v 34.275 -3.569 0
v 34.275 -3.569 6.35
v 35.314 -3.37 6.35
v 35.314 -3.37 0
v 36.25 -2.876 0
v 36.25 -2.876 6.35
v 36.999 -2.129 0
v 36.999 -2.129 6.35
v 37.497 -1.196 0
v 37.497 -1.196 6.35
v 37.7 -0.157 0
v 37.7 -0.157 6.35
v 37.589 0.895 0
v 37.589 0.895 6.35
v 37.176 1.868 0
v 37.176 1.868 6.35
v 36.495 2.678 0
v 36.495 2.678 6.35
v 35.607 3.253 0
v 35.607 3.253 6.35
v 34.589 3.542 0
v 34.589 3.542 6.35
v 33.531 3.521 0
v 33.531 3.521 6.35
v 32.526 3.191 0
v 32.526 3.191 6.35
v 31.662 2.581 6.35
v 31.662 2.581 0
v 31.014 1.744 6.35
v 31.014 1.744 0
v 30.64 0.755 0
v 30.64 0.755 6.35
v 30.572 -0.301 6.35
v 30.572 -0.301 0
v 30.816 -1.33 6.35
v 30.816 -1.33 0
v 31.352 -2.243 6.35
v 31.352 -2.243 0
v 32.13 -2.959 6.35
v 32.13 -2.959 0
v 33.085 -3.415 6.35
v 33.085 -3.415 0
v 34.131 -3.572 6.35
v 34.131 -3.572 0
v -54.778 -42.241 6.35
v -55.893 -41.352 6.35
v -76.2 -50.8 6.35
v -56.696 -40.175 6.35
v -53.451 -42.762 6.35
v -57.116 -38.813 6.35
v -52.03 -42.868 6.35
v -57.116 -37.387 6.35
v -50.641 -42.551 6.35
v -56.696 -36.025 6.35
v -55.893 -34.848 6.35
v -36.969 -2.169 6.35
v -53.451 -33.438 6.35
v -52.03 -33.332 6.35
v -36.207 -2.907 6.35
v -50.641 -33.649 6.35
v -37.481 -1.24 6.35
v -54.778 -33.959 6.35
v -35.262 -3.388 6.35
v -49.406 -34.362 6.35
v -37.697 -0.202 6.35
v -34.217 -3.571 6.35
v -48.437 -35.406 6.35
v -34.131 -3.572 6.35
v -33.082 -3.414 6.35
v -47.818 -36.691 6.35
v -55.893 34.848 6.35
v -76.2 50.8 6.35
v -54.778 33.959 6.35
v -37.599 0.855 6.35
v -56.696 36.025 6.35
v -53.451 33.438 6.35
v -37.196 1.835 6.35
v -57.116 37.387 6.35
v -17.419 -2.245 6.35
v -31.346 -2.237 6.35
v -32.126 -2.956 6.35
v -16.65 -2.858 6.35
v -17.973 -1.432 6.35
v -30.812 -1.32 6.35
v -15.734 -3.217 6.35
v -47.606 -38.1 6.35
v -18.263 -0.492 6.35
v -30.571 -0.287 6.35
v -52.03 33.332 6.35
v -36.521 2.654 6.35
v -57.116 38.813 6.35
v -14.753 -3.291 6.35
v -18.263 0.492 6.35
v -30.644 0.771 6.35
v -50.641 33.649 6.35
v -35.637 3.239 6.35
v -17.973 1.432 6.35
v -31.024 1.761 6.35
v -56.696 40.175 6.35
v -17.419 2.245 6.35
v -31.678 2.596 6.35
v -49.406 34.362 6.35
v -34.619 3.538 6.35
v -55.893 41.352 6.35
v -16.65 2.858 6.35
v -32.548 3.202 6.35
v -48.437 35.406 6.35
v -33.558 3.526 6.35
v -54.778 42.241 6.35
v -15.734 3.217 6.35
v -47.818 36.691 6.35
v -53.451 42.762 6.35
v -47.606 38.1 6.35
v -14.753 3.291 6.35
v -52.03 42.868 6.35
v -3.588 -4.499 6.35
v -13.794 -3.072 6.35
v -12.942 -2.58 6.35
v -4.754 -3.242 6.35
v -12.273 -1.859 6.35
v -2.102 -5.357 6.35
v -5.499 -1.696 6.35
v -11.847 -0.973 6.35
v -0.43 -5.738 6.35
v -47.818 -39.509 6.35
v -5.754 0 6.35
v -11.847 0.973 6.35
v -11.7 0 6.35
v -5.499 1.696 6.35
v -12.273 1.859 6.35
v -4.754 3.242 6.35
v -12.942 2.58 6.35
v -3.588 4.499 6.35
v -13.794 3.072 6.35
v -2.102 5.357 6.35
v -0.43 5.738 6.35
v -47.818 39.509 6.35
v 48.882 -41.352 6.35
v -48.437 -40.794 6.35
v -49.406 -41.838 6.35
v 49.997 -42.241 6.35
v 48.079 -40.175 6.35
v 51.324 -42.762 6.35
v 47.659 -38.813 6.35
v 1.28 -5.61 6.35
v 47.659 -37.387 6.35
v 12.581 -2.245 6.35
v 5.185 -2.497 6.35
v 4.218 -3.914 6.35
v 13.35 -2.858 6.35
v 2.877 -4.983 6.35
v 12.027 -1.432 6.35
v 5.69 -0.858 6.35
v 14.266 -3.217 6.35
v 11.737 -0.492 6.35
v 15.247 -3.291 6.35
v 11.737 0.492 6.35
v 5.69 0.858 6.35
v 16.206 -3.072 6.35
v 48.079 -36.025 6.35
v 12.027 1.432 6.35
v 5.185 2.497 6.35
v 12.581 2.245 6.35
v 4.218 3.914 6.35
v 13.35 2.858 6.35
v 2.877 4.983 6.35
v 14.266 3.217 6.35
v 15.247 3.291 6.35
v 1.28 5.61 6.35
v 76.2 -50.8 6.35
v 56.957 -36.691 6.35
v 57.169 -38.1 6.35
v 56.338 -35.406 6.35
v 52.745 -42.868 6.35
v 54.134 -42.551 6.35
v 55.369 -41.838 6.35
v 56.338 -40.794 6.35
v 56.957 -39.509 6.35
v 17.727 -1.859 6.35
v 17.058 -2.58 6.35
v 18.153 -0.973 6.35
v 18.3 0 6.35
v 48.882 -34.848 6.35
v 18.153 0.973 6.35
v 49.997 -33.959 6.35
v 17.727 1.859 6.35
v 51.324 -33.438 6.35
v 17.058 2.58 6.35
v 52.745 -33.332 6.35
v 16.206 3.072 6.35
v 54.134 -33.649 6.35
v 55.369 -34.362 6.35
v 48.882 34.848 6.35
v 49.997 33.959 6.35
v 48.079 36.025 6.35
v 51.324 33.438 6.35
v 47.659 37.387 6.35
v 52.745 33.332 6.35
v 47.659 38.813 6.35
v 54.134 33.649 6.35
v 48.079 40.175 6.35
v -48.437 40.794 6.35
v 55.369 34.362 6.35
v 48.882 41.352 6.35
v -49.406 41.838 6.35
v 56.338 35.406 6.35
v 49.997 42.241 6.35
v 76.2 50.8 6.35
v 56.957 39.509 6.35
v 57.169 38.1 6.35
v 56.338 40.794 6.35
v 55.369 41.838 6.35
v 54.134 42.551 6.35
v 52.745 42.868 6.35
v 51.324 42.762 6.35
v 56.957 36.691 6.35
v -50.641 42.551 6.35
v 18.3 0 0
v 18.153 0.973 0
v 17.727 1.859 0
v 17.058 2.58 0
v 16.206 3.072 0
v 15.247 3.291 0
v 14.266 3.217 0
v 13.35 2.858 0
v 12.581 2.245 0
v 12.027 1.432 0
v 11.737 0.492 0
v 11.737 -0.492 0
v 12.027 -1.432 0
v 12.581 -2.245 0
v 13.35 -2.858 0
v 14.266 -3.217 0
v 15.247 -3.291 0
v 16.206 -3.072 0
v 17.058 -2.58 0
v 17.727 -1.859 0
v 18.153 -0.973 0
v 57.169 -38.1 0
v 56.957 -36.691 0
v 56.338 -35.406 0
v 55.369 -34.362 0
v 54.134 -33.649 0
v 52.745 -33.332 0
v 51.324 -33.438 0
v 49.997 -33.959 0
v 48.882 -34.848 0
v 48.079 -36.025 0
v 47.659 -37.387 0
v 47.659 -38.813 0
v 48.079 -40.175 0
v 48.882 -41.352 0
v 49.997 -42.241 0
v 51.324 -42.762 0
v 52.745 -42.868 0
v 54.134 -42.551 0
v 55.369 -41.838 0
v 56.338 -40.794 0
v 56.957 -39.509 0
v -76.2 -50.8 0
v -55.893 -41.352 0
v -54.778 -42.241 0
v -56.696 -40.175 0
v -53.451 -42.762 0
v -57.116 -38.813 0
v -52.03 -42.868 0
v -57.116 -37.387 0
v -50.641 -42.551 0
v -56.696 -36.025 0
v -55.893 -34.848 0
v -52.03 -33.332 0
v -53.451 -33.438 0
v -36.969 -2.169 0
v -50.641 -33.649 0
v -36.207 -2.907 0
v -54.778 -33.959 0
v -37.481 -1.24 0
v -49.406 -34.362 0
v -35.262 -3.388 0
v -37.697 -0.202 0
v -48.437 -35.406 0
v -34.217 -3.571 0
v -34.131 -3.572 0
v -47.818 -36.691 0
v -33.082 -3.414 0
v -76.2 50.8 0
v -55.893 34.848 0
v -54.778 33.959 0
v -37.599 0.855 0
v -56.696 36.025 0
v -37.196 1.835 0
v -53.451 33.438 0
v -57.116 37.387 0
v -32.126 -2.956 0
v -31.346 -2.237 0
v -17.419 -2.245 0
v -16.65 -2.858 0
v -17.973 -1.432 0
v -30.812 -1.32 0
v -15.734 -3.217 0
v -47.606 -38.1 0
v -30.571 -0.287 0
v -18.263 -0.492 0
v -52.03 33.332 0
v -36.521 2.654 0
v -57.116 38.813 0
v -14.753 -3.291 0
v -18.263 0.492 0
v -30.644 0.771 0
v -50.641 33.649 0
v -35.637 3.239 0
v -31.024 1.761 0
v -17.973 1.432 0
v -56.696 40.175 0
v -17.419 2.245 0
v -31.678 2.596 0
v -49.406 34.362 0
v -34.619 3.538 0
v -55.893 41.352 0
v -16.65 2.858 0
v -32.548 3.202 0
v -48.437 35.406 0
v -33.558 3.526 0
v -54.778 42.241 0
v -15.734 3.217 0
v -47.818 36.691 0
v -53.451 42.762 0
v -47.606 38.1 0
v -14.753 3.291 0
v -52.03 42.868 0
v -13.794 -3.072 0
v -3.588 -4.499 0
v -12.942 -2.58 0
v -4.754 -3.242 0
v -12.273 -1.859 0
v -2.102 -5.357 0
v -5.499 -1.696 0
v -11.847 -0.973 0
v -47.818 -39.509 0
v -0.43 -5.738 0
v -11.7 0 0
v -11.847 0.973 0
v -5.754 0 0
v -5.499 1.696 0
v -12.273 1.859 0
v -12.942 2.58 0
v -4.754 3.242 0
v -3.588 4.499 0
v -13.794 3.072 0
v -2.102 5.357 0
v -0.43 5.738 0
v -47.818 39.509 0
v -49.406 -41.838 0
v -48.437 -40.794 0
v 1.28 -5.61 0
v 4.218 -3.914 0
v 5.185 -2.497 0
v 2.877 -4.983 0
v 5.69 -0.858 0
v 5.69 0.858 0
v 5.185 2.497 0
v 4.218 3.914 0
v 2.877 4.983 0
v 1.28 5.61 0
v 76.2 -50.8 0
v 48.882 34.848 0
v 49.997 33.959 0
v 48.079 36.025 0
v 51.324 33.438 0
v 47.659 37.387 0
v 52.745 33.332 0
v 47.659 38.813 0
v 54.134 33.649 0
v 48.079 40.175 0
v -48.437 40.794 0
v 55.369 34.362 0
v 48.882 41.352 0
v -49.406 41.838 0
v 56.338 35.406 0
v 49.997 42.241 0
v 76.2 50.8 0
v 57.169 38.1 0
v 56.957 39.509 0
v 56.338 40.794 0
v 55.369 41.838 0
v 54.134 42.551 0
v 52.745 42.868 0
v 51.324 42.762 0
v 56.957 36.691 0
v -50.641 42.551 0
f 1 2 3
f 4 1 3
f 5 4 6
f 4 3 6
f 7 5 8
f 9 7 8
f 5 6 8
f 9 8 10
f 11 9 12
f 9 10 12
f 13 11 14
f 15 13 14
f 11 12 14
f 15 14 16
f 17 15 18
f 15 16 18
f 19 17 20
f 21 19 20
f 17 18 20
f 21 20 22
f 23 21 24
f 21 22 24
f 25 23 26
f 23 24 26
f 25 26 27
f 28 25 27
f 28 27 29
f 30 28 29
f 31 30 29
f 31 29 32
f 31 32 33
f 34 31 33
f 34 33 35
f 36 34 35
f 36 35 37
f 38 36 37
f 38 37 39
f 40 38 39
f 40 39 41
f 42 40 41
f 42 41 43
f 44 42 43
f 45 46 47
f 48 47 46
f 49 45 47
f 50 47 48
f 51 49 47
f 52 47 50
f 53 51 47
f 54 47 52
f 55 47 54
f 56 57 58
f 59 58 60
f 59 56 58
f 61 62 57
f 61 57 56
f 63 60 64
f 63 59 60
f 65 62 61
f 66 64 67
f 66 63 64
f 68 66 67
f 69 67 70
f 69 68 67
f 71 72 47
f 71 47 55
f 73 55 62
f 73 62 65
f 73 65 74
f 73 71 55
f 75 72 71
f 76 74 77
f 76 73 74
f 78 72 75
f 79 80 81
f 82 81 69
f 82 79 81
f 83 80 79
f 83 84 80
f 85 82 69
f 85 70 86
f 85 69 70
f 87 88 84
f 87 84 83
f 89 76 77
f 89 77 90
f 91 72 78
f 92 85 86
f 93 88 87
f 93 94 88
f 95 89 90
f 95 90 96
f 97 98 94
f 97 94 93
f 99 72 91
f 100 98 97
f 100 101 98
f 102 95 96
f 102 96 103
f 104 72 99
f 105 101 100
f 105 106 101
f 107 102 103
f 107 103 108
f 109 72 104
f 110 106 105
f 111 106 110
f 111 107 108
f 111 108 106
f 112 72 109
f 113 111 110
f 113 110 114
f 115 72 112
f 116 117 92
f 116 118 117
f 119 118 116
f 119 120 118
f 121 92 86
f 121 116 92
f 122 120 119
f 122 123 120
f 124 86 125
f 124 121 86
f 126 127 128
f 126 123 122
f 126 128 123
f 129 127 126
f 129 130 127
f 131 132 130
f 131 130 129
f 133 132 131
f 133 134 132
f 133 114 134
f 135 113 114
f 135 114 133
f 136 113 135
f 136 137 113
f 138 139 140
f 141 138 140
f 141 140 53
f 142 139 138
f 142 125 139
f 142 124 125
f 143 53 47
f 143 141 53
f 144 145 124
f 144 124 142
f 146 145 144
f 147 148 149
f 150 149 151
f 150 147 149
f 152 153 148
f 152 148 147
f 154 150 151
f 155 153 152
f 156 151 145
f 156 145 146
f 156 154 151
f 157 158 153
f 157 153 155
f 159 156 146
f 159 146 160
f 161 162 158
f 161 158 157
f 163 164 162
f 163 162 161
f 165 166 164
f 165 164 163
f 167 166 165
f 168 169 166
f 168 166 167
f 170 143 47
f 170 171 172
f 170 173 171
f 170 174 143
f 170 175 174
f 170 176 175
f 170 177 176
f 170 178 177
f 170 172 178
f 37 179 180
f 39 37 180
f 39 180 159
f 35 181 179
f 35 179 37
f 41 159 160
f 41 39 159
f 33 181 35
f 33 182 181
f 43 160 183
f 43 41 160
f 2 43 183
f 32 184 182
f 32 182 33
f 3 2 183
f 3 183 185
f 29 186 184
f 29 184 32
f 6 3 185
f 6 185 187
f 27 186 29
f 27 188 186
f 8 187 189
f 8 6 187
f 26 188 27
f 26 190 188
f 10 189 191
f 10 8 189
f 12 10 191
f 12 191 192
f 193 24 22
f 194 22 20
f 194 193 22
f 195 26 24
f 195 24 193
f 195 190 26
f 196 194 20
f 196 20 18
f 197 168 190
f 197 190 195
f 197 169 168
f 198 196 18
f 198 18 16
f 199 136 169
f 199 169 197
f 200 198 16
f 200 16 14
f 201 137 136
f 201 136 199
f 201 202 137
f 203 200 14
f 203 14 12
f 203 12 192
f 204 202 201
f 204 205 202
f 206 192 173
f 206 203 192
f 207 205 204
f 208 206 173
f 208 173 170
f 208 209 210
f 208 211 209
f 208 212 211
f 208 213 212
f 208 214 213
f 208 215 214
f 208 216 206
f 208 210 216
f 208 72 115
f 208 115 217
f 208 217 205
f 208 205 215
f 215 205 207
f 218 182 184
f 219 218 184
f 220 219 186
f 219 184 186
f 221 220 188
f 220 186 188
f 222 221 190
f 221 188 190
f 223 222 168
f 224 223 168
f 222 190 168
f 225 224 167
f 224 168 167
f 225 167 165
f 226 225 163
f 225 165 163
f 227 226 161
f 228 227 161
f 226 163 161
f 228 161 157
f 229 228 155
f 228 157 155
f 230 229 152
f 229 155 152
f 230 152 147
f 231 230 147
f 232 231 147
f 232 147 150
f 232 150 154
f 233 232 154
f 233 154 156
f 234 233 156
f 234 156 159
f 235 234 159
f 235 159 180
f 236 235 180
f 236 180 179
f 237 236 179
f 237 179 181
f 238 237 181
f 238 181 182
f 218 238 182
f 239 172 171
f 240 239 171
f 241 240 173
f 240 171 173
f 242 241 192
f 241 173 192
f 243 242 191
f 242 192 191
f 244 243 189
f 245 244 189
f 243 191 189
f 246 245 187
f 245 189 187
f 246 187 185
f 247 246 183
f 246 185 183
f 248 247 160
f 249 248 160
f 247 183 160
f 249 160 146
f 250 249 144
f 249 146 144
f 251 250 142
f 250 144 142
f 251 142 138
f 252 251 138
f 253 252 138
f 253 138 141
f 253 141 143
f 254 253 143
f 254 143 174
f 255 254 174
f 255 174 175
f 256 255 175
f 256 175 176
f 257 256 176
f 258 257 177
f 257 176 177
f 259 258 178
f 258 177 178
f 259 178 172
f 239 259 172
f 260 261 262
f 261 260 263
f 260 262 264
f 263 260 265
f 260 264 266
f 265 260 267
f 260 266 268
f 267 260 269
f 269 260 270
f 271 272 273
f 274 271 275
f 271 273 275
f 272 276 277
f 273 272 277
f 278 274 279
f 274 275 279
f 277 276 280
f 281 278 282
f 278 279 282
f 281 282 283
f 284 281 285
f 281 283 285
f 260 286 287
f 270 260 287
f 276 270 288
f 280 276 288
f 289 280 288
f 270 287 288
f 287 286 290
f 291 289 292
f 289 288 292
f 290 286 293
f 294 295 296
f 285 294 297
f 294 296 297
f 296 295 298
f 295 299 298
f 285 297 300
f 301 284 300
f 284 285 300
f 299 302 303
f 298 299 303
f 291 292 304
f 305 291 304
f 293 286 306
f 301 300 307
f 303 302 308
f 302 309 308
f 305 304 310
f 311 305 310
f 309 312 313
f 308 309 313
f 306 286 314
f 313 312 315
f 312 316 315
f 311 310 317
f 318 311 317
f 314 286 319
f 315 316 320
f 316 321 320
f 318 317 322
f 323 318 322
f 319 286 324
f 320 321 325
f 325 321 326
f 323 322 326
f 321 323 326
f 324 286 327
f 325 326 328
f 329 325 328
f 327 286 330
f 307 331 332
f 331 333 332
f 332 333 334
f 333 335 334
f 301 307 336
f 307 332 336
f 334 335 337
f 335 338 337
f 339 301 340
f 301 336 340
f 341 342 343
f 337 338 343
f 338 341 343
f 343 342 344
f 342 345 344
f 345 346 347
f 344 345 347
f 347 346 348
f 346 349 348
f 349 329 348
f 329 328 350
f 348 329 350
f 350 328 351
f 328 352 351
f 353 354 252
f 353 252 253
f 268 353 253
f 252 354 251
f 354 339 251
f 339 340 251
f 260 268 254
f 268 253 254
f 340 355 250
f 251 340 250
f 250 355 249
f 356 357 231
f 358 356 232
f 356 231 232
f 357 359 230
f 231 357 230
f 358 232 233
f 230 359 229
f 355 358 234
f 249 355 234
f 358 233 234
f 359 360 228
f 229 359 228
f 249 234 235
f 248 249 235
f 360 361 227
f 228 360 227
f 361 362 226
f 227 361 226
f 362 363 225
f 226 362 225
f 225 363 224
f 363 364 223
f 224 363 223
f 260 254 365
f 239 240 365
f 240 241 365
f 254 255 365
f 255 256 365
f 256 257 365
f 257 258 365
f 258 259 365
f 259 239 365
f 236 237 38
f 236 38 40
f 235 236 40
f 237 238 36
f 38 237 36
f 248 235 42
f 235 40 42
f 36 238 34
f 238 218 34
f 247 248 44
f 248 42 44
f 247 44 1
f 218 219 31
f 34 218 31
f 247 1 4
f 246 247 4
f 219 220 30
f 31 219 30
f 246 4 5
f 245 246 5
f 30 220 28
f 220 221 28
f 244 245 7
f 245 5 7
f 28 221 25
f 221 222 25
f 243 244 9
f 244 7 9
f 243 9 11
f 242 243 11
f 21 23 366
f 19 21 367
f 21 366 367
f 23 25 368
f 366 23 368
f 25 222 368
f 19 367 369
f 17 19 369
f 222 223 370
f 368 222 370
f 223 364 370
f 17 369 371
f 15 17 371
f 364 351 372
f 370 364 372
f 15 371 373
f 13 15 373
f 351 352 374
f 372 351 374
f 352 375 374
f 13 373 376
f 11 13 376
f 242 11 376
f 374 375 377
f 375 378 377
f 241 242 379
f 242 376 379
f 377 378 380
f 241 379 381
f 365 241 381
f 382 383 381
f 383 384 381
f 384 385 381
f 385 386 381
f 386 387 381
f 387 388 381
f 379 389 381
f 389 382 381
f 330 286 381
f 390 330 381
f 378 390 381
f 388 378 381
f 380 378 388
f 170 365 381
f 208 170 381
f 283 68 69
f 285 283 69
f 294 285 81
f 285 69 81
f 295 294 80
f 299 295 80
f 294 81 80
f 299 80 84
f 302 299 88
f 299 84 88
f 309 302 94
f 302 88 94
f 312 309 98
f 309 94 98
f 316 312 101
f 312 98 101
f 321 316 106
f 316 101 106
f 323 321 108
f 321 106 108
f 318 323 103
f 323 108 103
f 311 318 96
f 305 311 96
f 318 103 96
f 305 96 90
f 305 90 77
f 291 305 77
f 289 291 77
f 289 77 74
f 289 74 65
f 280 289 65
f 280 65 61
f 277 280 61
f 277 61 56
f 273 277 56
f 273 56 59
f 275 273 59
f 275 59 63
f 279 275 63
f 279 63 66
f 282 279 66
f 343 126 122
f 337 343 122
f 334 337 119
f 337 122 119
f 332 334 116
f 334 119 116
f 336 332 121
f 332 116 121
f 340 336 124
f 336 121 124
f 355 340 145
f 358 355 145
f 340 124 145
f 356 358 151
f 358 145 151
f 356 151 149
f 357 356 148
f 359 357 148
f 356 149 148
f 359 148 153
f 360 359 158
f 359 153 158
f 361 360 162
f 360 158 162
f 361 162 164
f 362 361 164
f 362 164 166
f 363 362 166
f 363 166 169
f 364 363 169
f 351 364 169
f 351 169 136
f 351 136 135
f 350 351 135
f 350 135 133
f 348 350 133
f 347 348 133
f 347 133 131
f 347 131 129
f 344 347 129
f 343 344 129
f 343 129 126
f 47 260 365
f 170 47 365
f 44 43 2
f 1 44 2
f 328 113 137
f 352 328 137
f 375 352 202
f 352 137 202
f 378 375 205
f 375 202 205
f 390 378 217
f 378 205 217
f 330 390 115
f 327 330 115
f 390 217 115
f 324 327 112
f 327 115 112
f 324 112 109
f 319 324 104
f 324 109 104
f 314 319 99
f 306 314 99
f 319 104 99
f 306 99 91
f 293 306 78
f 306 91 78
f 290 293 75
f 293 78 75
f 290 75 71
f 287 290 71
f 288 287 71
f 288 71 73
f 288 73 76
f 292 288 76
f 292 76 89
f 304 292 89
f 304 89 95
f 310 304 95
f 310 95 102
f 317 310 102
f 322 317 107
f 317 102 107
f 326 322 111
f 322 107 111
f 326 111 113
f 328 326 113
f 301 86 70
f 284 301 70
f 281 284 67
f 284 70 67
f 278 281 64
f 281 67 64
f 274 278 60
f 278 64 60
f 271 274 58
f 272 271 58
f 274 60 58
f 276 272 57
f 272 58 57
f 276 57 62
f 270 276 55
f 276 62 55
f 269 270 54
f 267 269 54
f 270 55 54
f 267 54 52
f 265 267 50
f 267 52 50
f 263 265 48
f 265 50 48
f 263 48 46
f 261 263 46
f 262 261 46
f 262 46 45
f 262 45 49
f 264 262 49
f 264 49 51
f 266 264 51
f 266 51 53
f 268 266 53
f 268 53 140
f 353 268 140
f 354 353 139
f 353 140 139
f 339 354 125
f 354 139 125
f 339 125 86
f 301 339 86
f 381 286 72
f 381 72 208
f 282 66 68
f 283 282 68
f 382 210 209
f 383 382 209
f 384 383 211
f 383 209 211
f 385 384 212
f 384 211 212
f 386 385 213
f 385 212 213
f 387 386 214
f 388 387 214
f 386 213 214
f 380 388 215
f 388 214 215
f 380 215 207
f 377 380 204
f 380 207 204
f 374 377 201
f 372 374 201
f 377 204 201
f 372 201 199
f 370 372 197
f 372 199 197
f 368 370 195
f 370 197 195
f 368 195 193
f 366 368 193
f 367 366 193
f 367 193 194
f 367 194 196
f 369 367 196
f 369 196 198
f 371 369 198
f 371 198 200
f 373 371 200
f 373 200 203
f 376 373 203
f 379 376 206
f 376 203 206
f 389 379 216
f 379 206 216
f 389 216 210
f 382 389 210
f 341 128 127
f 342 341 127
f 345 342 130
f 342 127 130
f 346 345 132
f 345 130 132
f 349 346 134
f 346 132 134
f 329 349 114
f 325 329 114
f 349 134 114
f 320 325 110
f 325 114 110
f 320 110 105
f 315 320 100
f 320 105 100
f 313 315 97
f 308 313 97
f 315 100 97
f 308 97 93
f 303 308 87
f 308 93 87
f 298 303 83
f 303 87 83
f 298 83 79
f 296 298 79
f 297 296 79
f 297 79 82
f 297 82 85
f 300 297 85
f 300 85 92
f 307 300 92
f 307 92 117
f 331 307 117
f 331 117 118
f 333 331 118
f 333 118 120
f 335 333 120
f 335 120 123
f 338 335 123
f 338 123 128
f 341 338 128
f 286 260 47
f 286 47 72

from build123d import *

# Parameters (mm, degrees)
F0_W     = 152.4
F0_H     = 101.6
F1_DEPTH = 6.35
F2_R     = 4.78155
F3_DEPTH = 6.35
F5_DEPTH = 6.351
F6_R     = 3.3
F7_DEPTH = 6.351
F9_D     = 11.50874


with BuildPart() as f1:
    # F0 (on Top) → F1 (new body)
    with BuildSketch(Plane.XY):
        Rectangle(F0_W, F0_H)
    extrude(amount=F1_DEPTH)

    # F2 (on face) → F3 (cut, through all)
    with BuildSketch(Plane.XY.offset(6.35)):
        with Locations((-52.3875, 38.1)):
            Circle(F2_R)
        with Locations((52.3875, 38.1)):
            Circle(F2_R)
        with Locations((-52.3875, -38.1)):
            Circle(F2_R)
        with Locations((52.3875, -38.1)):
            Circle(F2_R)
    extrude(amount=-F3_DEPTH, mode=Mode.SUBTRACT)

    # F4 (on face) → F5 (cut, through all)
    with BuildSketch(Plane.XY.offset(6.35)):
        with BuildLine():
            Line((-34.2171942442, -3.5708408817), (-34.13125, -3.571875))
            ThreePointArc((-34.13125, -3.571875), (-34.0882747673, 3.5716164611), (-34.2171942442, -3.5708408817))
        make_face()
        with BuildLine():
            Line((34.13125, -3.571875), (34.2751243473, -3.56897621))
            ThreePointArc((34.2751243473, -3.56897621), (34.0592982266, 3.571150229), (34.13125, -3.571875))
        make_face()
    extrude(amount=-F5_DEPTH, mode=Mode.SUBTRACT)

    # F6 (on face) → F7 (cut, through all)
    with BuildSketch(Plane.XY.offset(6.35)):
        with Locations((-15, 0)):
            Circle(F6_R)
        with Locations((15, 0)):
            Circle(F6_R)
    extrude(amount=-F7_DEPTH, mode=Mode.SUBTRACT)

    # F9 (through all)
    with Locations(Plane(origin=(0, 0, 0), x_dir=(1, 0, 0), z_dir=(0, 0, -1))):
        with Locations((0, 0)):
            Hole(F9_D / 2)


solid = f1.part
